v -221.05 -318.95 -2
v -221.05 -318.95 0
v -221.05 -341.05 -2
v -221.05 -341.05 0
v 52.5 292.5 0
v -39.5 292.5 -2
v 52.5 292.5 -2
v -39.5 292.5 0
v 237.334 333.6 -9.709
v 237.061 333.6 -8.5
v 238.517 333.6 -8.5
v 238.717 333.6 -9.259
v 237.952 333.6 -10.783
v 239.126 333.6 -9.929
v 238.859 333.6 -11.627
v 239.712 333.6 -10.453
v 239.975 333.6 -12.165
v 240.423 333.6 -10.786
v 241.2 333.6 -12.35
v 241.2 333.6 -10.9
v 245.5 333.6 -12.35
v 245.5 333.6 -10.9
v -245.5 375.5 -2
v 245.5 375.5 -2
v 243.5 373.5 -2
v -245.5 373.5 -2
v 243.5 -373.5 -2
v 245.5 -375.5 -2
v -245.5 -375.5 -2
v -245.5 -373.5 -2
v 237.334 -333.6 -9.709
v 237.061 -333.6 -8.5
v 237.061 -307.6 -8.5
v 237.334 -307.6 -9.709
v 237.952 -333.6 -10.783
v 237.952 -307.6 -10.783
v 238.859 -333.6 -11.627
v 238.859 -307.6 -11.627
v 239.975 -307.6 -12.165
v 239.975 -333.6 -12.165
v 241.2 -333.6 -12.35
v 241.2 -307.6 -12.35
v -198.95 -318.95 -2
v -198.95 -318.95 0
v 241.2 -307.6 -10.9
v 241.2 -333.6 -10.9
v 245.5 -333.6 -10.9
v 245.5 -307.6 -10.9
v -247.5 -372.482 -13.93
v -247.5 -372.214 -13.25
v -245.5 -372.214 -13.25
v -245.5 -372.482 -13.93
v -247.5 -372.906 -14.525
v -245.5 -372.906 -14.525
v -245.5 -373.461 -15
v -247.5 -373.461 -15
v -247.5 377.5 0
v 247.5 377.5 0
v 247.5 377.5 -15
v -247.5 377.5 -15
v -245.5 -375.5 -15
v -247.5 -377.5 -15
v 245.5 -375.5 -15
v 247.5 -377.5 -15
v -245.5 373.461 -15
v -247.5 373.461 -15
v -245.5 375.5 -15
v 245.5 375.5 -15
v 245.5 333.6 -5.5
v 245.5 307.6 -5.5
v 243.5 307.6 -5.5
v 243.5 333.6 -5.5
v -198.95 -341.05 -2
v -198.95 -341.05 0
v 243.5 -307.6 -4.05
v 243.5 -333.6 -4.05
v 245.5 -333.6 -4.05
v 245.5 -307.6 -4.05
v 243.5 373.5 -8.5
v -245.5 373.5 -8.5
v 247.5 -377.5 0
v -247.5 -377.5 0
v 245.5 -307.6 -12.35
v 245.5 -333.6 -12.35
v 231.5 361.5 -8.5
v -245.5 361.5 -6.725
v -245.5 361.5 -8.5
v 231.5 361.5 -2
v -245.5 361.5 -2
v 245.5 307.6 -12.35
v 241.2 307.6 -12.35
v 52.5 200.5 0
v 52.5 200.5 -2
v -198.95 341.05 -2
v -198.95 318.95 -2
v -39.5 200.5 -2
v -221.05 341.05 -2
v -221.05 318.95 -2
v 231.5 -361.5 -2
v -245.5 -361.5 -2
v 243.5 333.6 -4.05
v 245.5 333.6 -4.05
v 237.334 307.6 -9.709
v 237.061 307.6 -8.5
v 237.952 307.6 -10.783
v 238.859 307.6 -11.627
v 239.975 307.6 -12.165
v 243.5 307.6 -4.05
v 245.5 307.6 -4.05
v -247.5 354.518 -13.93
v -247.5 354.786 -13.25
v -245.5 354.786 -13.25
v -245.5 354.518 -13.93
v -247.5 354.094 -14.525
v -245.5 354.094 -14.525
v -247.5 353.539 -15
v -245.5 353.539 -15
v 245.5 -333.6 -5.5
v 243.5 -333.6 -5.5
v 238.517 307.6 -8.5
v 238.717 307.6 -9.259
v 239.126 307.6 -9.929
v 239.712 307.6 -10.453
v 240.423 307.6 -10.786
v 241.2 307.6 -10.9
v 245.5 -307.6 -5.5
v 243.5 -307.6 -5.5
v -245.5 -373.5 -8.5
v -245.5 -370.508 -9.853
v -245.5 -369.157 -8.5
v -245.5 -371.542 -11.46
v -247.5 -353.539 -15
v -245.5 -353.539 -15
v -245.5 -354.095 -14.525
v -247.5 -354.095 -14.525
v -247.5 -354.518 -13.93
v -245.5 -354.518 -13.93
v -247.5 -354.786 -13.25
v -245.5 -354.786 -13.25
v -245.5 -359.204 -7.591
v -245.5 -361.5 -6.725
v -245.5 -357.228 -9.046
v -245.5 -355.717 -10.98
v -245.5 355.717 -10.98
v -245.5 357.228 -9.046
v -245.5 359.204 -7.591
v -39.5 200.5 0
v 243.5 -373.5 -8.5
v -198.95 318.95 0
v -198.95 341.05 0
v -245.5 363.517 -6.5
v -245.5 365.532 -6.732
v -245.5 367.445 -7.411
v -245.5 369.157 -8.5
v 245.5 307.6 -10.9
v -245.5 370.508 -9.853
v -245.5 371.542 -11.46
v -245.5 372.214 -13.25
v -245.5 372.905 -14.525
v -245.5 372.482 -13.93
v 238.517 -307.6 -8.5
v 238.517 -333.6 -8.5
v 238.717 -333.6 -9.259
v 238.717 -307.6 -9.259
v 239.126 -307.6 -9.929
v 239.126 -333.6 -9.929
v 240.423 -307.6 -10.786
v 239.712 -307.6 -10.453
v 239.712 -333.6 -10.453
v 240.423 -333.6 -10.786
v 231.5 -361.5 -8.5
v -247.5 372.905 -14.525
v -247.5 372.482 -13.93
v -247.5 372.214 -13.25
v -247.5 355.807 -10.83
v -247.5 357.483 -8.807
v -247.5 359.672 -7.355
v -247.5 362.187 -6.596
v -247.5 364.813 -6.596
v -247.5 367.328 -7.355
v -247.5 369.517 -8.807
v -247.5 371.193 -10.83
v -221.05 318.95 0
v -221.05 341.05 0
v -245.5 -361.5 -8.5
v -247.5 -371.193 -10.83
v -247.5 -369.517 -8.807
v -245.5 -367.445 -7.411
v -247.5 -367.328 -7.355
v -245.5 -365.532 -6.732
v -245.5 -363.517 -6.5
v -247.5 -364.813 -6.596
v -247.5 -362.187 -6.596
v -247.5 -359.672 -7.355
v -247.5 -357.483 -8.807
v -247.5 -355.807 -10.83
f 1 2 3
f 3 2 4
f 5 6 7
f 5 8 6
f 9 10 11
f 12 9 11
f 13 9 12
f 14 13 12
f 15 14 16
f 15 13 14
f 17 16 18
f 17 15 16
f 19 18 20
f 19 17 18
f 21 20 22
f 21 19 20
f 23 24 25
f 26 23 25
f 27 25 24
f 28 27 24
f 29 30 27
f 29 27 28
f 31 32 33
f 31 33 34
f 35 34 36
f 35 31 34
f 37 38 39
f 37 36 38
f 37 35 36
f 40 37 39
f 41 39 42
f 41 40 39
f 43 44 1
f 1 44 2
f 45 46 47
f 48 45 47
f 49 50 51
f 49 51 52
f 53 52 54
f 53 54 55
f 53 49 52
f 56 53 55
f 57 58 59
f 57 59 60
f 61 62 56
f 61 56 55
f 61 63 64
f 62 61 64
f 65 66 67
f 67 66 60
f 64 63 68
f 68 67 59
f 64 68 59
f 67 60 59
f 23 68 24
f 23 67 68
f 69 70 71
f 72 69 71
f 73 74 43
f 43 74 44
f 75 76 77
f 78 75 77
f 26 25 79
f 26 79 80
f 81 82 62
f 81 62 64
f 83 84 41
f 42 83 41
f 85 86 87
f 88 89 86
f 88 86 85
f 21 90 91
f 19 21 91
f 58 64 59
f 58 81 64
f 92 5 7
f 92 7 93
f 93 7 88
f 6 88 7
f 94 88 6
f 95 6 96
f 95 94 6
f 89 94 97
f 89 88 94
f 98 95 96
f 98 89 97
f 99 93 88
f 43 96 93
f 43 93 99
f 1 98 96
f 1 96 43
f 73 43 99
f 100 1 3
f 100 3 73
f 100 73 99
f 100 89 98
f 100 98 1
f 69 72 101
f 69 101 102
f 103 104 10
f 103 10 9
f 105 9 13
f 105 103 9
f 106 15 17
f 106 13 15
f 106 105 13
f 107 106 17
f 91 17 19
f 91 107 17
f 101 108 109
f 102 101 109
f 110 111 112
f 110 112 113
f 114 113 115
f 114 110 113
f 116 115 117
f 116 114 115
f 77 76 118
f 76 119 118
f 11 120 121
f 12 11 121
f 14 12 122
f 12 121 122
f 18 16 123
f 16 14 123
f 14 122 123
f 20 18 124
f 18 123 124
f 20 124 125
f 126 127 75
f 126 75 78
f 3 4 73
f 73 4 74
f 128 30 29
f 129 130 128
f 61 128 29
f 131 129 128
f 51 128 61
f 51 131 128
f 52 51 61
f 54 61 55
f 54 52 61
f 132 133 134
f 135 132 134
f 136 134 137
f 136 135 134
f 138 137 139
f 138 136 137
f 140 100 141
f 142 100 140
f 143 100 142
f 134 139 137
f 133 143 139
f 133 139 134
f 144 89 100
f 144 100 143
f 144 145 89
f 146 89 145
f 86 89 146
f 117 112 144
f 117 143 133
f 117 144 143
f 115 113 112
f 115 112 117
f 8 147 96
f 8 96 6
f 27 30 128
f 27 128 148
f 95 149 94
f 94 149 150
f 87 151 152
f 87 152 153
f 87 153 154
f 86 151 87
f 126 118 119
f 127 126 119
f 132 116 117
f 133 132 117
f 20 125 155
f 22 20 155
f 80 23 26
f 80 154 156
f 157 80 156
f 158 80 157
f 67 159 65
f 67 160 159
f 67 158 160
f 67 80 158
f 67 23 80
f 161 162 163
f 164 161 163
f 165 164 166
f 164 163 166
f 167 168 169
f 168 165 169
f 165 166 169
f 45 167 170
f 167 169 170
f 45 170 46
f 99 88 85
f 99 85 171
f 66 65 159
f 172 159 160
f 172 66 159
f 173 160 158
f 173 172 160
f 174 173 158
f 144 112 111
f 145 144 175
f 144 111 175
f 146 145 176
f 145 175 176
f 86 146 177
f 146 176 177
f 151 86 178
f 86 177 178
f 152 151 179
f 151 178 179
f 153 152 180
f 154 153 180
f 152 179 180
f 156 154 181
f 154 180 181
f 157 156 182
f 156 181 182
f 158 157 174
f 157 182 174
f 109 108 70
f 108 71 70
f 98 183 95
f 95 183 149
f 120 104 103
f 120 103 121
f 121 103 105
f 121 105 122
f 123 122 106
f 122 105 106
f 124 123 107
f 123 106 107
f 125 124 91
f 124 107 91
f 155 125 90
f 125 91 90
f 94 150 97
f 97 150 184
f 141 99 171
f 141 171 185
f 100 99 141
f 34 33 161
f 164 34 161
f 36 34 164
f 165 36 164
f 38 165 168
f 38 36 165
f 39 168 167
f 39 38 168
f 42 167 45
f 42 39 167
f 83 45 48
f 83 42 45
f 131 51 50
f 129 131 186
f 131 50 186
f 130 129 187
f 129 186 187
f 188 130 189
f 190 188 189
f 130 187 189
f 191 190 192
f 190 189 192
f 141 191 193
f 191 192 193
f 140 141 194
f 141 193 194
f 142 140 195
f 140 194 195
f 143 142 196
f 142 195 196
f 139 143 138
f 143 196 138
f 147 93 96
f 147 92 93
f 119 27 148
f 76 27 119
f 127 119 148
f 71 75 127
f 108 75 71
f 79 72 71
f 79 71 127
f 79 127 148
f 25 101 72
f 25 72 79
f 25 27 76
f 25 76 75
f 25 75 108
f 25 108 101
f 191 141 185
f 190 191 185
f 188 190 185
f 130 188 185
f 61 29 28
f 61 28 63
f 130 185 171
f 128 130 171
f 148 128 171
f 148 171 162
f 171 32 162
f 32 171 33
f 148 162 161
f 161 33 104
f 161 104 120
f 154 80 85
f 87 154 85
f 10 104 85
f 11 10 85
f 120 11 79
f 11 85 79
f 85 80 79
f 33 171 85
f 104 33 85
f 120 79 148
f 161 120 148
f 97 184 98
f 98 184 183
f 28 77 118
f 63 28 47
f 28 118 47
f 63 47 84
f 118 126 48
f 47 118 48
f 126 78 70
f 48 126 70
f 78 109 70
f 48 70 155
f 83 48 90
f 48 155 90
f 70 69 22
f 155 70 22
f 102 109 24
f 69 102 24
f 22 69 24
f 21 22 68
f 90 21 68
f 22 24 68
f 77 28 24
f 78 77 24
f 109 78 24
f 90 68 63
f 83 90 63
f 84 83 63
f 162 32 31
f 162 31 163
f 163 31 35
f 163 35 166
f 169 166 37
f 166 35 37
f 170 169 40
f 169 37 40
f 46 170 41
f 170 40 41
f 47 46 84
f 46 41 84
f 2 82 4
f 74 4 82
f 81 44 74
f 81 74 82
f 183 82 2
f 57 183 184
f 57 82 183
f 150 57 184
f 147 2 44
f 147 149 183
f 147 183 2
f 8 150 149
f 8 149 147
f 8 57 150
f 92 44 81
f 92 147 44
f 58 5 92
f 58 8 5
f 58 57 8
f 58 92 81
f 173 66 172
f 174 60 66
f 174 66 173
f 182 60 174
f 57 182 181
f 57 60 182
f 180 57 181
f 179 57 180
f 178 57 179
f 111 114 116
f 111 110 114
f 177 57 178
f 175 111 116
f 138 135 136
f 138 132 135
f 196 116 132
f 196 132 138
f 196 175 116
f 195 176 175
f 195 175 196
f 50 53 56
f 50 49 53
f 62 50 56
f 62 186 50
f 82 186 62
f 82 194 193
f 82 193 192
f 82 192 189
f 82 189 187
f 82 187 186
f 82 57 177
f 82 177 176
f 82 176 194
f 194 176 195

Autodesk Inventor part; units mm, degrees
sketch "Skizze_1" plane through (0, 0, 0) normal (0, 0, 1) x (1, 0, 0)
  line L0 (-247.5, 377.5) -> (-247.5, -377.5)
  line L1 (-247.5, -377.5) -> (247.5, -377.5)
  line L2 (247.5, -377.5) -> (247.5, 377.5)
  line L3 (247.5, 377.5) -> (-247.5, 377.5)
extrude "Extrusion1" add sketch "Skizze_1" against normal blind 15
sketch "Skizze_2" plane through (0, 0, 0) normal (1, 0, 0) x (0, 0, -1)
  line L0 (2, 375.5) -> (2, -375.5)
  line L1 (2, -375.5) -> (17, -375.5)
  line L2 (17, -375.5) -> (17, 375.5)
  line L3 (17, 375.5) -> (2, 375.5)
extrude "Extrusion2" cut sketch "Skizze_2" along normal mid plane 491
sketch "Skizze_3" plane through (0, 0, -2) normal (0, 0, 1) x (1, 0, 0)
  line L0 (-245.5, 361.5) -> (231.5, 361.5)
  line L1 (231.5, 361.5) -> (231.5, -361.5)
  line L2 (231.5, -361.5) -> (-245.5, -361.5)
  line L3 (-245.5, -361.5) -> (-245.5, -373.5)
  line L4 (-245.5, -373.5) -> (243.5, -373.5)
  line L5 (243.5, -373.5) -> (243.5, 373.5)
  line L6 (243.5, 373.5) -> (-245.5, 373.5)
  line L7 (-245.5, 373.5) -> (-245.5, 361.5)
sketch "Skizze_21" plane through (0, -320.6, 0) normal (0, 1, 0) x (1, 0, 0)
  arc A0 (241.2, 12.35) -> (241.2, 4.05) centre (241.2, 8.2) ccw
  line L0 (241.2, 4.05) -> (245.5, 4.05)
  line L1 (245.5, 4.05) -> (245.5, 5.5)
  line L2 (245.5, 5.5) -> (241.2, 5.5)
  arc A1 (241.2, 10.9) -> (241.2, 5.5) centre (241.2, 8.2) ccw
  line L3 (241.2, 10.9) -> (245.5, 10.9)
  line L4 (245.5, 10.9) -> (245.5, 12.35)
  line L5 (245.5, 12.35) -> (241.2, 12.35)
extrude "Extrusion3" add sketch "Skizze_21" along normal mid plane 26
sketch "Skizze_22" plane through (0, 320.6, 0) normal (0, 1, 0) x (1, 0, 0)
  arc A0 (241.2, 12.35) -> (241.2, 4.05) centre (241.2, 8.2) ccw
  line L0 (241.2, 4.05) -> (245.5, 4.05)
  line L1 (245.5, 4.05) -> (245.5, 5.5)
  line L2 (245.5, 5.5) -> (241.2, 5.5)
  arc A1 (241.2, 10.9) -> (241.2, 5.5) centre (241.2, 8.2) ccw
  line L3 (241.2, 10.9) -> (245.5, 10.9)
  line L4 (245.5, 10.9) -> (245.5, 12.35)
  line L5 (245.5, 12.35) -> (241.2, 12.35)
extrude "Extrusion4" add sketch "Skizze_22" along normal mid plane 26
sketch "Skizze_24" plane through (0, 0, 0) normal (0, 0, 1) x (1, 0, 0)
  line L0 (-221.05, -318.95) -> (-221.05, -341.05)
  line L1 (-221.05, -341.05) -> (-198.95, -341.05)
  line L2 (-198.95, -341.05) -> (-198.95, -318.95)
  line L3 (-198.95, -318.95) -> (-221.05, -318.95)
extrude "Extrusion5" cut sketch "Skizze_24" against normal blind 2
sketch "Skizze_41" plane through (0, 0, 0) normal (0, 0, 1) x (1, 0, 0)
  line L0 (-221.05, 341.05) -> (-221.05, 318.95)
  line L1 (-221.05, 318.95) -> (-198.95, 318.95)
  line L2 (-198.95, 318.95) -> (-198.95, 341.05)
  line L3 (-198.95, 341.05) -> (-221.05, 341.05)
extrude "Extrusion6" cut sketch "Skizze_41" against normal blind 2
sketch "Skizze_23" plane through (-247.5, 0, 0) normal (1, 0, 0) x (0, 0, -1)
  arc A0 (13.25, 372.2142) -> (13.25, 354.7858) centre (15.5, 363.5) ccw
  arc A1 (15.5, 351.881) -> (13.25, 354.7858) centre (12.5, 351.881) ccw
  line L0 (15.5, 351.881) -> (15.5, 375.119)
  arc A2 (13.25, 372.2142) -> (15.5, 375.119) centre (12.5, 375.119) ccw
extrude "Extrusion7" cut sketch "Skizze_23" along normal blind 3
sketch "Skizze_26" plane through (-247.5, 0, 0) normal (1, 0, 0) x (0, 0, -1)
  arc A0 (13.25, -354.7858) -> (13.25, -372.2142) centre (15.5, -363.5) ccw
  arc A1 (15.5, -375.119) -> (13.25, -372.2142) centre (12.5, -375.119) ccw
  line L0 (15.5, -375.119) -> (15.5, -351.881)
  arc A2 (13.25, -354.7858) -> (15.5, -351.881) centre (12.5, -351.881) ccw
extrude "Extrusion8" cut sketch "Skizze_26" along normal blind 3
extrude "Extrusion9" add sketch "Skizze_3" against normal blind 6.5
ref_plane "tuer_XY" through (241.2, -320.6, -8.2) normal (0, 1, 0) x (1, 0, 0)
ref_plane "tuer_YZ" through (241.2, -320.6, -8.2) normal (1, 0, 0) x (0, 0, -1)
ref_plane "tuer_ZX" through (241.2, -320.6, -8.2) normal (0, 0, -1) x (0, 1, 0)
ref_plane "verschluss_XY" through (-210, -330, 0) normal (0, 0, 1) x (1, 0, 0)
ref_plane "verschluss_YZ" through (-210, -330, 0) normal (1, 0, 0) x (0, 1, 0)
ref_plane "verschluss_ZX" through (-210, -330, 0) normal (0, 1, 0) x (0, 0, 1)
ref_plane "verschluss2_XY" through (-210, 330, 0) normal (0, 0, 1) x (1, 0, 0)
ref_plane "verschluss2_YZ" through (-210, 330, 0) normal (1, 0, 0) x (0, 1, 0)
ref_plane "verschluss2_ZX" through (-210, 330, 0) normal (0, 1, 0) x (0, 0, 1)
sketch "Эскиз10" plane through (0, 0, 0) normal (0, 0, 1) x (1, 0, 0)
  line L0 (-39.5, 292.5) -> (52.5, 292.5)
  line L1 (52.5, 292.5) -> (52.5, 200.5)
  line L2 (52.5, 200.5) -> (-39.5, 200.5)
  line L3 (-39.5, 200.5) -> (-39.5, 292.5)
  line L4 (247.5, -377.5) -> (247.5, 377.5) projected
  line L5 (247.5, 377.5) -> (-247.5, 377.5) projected
  point P0 (0, 0)
  dimension "d20" = 92
  dimension "d21" = 92
  dimension "d22" = 195
  dimension "d23" = 85
extrude "Выдавливание10" cut sketch "Эскиз10" against normal blind 10
properties part number "1130_01_03 (2)"
